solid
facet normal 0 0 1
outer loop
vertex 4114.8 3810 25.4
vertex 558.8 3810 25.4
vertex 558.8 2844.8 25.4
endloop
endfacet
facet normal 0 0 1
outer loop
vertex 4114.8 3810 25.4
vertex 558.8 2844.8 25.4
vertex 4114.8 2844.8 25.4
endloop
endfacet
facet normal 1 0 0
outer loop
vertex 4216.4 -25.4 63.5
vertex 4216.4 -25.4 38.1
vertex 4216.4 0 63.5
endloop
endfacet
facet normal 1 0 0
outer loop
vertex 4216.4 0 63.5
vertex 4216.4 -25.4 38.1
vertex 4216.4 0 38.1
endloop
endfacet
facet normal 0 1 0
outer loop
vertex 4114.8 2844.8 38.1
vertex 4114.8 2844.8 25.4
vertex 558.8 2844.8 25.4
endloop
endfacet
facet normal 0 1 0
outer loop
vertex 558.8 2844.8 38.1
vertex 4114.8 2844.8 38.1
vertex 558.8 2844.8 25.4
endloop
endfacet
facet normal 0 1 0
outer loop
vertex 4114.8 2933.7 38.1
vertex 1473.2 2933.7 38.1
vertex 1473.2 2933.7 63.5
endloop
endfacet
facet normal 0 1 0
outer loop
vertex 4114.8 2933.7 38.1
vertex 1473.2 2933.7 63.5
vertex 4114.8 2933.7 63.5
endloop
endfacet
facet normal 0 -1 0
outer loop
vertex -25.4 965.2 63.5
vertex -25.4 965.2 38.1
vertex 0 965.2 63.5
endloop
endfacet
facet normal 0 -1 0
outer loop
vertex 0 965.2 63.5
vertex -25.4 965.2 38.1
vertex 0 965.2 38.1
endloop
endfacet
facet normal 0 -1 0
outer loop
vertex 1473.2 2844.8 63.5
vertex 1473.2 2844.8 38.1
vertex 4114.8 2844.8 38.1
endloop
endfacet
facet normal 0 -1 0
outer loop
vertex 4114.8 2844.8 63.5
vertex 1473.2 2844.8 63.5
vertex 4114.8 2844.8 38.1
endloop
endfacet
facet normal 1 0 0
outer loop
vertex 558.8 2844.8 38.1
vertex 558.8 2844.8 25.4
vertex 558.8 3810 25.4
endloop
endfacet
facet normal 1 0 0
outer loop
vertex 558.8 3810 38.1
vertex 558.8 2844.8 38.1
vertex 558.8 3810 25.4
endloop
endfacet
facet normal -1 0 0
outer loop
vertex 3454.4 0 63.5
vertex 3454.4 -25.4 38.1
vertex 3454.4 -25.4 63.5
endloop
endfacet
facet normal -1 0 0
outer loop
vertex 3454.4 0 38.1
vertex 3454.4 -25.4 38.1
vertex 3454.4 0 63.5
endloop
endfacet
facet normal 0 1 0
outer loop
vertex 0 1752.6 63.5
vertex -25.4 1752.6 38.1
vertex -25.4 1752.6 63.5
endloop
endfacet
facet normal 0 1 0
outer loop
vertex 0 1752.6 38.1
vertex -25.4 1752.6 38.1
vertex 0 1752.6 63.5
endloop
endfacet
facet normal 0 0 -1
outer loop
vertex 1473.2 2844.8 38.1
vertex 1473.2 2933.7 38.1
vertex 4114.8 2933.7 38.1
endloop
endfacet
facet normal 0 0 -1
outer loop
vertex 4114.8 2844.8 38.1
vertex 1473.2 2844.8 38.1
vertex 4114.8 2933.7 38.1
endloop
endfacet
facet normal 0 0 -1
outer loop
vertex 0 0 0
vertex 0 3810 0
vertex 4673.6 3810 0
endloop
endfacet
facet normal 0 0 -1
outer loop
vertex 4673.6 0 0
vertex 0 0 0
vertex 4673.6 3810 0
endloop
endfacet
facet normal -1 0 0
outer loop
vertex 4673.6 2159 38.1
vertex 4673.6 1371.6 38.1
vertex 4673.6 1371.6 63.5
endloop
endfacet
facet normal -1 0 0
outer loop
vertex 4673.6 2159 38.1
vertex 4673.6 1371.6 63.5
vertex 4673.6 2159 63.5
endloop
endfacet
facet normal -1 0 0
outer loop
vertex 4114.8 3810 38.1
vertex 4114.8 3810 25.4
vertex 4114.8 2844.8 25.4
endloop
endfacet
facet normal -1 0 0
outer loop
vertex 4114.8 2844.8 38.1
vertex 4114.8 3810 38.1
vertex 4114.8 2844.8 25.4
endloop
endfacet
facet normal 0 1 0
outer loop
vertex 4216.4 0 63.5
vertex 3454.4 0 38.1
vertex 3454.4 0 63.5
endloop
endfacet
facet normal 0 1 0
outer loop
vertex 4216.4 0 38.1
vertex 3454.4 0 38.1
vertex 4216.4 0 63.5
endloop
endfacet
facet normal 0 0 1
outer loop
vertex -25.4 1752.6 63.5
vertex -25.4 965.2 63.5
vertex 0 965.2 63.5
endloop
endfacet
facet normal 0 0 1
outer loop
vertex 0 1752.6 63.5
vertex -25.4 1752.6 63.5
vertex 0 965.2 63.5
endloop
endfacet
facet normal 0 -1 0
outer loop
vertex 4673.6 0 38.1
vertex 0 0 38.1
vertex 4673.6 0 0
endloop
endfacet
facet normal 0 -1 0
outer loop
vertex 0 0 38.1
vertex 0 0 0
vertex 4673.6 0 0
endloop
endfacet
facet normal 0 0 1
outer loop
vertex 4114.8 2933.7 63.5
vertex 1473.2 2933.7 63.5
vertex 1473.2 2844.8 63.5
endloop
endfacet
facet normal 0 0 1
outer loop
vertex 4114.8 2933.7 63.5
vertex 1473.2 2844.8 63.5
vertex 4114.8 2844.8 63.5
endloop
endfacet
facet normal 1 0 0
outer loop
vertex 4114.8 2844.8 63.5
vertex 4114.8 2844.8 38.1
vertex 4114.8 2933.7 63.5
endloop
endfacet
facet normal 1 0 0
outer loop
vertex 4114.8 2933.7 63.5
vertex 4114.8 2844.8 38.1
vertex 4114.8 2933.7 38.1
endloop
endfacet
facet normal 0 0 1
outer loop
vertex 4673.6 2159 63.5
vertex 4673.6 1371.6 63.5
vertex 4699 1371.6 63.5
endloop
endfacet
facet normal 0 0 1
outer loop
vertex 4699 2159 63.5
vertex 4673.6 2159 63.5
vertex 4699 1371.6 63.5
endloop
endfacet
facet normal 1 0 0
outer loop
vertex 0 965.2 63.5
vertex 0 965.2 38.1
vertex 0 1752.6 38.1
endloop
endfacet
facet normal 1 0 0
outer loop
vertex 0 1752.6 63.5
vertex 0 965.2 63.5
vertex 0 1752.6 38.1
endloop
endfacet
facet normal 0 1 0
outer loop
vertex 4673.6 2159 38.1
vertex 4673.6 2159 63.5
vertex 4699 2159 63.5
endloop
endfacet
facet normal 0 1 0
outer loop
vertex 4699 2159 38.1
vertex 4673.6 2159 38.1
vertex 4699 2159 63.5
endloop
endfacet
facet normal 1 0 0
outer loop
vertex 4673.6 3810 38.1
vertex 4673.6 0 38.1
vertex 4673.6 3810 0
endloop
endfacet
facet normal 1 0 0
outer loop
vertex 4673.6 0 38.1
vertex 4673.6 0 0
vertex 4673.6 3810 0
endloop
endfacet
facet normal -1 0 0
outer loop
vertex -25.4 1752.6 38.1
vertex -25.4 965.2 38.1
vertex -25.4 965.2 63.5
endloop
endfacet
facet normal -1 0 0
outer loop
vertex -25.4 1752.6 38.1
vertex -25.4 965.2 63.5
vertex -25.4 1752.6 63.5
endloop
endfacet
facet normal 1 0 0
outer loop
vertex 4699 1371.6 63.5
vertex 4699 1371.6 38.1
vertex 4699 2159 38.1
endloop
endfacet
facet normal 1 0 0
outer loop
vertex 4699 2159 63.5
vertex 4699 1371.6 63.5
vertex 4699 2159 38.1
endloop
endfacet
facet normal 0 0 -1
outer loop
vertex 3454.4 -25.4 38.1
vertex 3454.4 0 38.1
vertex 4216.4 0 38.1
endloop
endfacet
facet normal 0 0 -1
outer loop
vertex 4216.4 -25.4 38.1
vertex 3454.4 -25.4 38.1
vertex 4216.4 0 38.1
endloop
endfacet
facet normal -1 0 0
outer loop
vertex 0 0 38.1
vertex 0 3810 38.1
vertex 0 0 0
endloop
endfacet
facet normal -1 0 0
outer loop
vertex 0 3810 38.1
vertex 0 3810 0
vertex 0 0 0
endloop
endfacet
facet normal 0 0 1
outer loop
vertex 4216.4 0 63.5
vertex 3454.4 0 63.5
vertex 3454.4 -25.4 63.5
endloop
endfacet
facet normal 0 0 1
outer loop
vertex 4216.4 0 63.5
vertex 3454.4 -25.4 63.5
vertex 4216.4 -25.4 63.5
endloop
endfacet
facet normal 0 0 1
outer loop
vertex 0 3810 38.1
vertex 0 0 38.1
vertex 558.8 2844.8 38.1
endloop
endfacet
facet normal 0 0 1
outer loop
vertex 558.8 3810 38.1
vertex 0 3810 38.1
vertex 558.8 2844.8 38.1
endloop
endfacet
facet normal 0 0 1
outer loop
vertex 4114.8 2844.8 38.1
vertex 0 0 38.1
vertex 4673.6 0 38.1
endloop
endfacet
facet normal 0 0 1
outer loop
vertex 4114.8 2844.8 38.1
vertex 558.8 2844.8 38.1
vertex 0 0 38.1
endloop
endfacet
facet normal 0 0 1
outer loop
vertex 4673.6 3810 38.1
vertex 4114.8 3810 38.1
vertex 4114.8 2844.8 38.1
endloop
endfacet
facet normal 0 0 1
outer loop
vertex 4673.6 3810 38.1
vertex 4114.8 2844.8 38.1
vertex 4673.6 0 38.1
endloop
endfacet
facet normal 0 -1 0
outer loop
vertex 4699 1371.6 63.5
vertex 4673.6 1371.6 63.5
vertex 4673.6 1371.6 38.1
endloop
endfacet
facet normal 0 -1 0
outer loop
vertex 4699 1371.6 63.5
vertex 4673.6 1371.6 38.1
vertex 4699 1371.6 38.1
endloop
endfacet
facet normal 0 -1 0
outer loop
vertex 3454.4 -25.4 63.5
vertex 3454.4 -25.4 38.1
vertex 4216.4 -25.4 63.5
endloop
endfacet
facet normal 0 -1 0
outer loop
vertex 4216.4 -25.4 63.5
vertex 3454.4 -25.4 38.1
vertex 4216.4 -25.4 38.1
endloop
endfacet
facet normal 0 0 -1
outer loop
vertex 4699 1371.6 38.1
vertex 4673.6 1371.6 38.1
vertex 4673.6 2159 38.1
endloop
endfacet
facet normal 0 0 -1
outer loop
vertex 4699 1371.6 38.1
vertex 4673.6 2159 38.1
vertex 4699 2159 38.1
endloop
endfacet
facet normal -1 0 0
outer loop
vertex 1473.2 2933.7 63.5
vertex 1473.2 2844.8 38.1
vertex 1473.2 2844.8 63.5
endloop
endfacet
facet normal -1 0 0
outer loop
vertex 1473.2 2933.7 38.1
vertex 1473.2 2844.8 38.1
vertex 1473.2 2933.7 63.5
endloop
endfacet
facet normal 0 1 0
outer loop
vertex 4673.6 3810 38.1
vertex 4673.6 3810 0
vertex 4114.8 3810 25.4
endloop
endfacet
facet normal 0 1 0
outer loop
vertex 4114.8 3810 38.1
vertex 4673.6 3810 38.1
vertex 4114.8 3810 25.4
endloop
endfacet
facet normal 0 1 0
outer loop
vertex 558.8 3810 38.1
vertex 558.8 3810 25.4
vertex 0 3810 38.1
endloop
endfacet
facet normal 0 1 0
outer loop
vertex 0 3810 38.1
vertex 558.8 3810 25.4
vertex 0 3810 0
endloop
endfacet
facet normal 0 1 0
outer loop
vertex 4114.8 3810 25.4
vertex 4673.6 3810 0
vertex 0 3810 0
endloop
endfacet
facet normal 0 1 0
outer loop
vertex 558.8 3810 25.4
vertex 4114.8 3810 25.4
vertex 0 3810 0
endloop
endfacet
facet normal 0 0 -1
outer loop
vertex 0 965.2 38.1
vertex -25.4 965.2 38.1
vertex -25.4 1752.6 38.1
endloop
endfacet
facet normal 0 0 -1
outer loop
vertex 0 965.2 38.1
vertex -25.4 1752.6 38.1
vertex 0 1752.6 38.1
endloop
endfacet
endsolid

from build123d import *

# Parameters (mm, degrees)
F0_W     = 4673.6
F0_H     = 3810
F1_DEPTH = 25.4
F3_DEPTH = 12.7
F4_W     = 2641.6
F4_H     = 88.9
F5_DEPTH = 25.4
F6_W     = 25.4
F6_H     = 787.4
F7_DEPTH = 25.4
F8_W     = 25.4
F8_H     = 787.4
F8_W_2   = 762
F8_H_2   = 25.4
F9_DEPTH = 25.4


with BuildPart() as f1:
    # F0 (on Top) → F1 (new body)
    with BuildSketch(Plane.XY):
        with Locations((2336.8, 1905)):
            Rectangle(F0_W, F0_H)
    extrude(amount=F1_DEPTH)

    # F2 (on face) → F3 (join)
    with BuildSketch(Plane.XY.offset(25.4)):
        Polygon((558.8, 2844.8), (558.8, 3810), (0, 3810), (0, 0), (4673.6, 0), (4673.6, 3810), (4114.8, 3810), (4114.8, 2844.8), align=None)
    extrude(amount=F3_DEPTH)


with BuildPart() as f5:
    # F4 (on face) → F5 (new body)
    with BuildSketch(Plane.XY.offset(38.1)):
        with Locations((2794, 2889.25)):
            Rectangle(F4_W, F4_H)
    extrude(amount=F5_DEPTH)


with BuildPart() as f7:
    # F6 (on face) → F7 (new body)
    with BuildSketch(Plane.XY.offset(38.1)):
        with Locations((-12.7, 1358.9)):
            Rectangle(F6_W, F6_H)
    extrude(amount=F7_DEPTH)


with BuildPart() as f9:
    # F8 (on face) → F9 (new body)
    with BuildSketch(Plane.XY.offset(38.1)):
        with Locations((4686.3, 1765.3)):
            Rectangle(F8_W, F8_H)
        with Locations((3835.4, -12.7)):
            Rectangle(F8_W_2, F8_H_2)
    extrude(amount=F9_DEPTH)


solid = Compound([f1.part, f5.part, f7.part, f9.part])
